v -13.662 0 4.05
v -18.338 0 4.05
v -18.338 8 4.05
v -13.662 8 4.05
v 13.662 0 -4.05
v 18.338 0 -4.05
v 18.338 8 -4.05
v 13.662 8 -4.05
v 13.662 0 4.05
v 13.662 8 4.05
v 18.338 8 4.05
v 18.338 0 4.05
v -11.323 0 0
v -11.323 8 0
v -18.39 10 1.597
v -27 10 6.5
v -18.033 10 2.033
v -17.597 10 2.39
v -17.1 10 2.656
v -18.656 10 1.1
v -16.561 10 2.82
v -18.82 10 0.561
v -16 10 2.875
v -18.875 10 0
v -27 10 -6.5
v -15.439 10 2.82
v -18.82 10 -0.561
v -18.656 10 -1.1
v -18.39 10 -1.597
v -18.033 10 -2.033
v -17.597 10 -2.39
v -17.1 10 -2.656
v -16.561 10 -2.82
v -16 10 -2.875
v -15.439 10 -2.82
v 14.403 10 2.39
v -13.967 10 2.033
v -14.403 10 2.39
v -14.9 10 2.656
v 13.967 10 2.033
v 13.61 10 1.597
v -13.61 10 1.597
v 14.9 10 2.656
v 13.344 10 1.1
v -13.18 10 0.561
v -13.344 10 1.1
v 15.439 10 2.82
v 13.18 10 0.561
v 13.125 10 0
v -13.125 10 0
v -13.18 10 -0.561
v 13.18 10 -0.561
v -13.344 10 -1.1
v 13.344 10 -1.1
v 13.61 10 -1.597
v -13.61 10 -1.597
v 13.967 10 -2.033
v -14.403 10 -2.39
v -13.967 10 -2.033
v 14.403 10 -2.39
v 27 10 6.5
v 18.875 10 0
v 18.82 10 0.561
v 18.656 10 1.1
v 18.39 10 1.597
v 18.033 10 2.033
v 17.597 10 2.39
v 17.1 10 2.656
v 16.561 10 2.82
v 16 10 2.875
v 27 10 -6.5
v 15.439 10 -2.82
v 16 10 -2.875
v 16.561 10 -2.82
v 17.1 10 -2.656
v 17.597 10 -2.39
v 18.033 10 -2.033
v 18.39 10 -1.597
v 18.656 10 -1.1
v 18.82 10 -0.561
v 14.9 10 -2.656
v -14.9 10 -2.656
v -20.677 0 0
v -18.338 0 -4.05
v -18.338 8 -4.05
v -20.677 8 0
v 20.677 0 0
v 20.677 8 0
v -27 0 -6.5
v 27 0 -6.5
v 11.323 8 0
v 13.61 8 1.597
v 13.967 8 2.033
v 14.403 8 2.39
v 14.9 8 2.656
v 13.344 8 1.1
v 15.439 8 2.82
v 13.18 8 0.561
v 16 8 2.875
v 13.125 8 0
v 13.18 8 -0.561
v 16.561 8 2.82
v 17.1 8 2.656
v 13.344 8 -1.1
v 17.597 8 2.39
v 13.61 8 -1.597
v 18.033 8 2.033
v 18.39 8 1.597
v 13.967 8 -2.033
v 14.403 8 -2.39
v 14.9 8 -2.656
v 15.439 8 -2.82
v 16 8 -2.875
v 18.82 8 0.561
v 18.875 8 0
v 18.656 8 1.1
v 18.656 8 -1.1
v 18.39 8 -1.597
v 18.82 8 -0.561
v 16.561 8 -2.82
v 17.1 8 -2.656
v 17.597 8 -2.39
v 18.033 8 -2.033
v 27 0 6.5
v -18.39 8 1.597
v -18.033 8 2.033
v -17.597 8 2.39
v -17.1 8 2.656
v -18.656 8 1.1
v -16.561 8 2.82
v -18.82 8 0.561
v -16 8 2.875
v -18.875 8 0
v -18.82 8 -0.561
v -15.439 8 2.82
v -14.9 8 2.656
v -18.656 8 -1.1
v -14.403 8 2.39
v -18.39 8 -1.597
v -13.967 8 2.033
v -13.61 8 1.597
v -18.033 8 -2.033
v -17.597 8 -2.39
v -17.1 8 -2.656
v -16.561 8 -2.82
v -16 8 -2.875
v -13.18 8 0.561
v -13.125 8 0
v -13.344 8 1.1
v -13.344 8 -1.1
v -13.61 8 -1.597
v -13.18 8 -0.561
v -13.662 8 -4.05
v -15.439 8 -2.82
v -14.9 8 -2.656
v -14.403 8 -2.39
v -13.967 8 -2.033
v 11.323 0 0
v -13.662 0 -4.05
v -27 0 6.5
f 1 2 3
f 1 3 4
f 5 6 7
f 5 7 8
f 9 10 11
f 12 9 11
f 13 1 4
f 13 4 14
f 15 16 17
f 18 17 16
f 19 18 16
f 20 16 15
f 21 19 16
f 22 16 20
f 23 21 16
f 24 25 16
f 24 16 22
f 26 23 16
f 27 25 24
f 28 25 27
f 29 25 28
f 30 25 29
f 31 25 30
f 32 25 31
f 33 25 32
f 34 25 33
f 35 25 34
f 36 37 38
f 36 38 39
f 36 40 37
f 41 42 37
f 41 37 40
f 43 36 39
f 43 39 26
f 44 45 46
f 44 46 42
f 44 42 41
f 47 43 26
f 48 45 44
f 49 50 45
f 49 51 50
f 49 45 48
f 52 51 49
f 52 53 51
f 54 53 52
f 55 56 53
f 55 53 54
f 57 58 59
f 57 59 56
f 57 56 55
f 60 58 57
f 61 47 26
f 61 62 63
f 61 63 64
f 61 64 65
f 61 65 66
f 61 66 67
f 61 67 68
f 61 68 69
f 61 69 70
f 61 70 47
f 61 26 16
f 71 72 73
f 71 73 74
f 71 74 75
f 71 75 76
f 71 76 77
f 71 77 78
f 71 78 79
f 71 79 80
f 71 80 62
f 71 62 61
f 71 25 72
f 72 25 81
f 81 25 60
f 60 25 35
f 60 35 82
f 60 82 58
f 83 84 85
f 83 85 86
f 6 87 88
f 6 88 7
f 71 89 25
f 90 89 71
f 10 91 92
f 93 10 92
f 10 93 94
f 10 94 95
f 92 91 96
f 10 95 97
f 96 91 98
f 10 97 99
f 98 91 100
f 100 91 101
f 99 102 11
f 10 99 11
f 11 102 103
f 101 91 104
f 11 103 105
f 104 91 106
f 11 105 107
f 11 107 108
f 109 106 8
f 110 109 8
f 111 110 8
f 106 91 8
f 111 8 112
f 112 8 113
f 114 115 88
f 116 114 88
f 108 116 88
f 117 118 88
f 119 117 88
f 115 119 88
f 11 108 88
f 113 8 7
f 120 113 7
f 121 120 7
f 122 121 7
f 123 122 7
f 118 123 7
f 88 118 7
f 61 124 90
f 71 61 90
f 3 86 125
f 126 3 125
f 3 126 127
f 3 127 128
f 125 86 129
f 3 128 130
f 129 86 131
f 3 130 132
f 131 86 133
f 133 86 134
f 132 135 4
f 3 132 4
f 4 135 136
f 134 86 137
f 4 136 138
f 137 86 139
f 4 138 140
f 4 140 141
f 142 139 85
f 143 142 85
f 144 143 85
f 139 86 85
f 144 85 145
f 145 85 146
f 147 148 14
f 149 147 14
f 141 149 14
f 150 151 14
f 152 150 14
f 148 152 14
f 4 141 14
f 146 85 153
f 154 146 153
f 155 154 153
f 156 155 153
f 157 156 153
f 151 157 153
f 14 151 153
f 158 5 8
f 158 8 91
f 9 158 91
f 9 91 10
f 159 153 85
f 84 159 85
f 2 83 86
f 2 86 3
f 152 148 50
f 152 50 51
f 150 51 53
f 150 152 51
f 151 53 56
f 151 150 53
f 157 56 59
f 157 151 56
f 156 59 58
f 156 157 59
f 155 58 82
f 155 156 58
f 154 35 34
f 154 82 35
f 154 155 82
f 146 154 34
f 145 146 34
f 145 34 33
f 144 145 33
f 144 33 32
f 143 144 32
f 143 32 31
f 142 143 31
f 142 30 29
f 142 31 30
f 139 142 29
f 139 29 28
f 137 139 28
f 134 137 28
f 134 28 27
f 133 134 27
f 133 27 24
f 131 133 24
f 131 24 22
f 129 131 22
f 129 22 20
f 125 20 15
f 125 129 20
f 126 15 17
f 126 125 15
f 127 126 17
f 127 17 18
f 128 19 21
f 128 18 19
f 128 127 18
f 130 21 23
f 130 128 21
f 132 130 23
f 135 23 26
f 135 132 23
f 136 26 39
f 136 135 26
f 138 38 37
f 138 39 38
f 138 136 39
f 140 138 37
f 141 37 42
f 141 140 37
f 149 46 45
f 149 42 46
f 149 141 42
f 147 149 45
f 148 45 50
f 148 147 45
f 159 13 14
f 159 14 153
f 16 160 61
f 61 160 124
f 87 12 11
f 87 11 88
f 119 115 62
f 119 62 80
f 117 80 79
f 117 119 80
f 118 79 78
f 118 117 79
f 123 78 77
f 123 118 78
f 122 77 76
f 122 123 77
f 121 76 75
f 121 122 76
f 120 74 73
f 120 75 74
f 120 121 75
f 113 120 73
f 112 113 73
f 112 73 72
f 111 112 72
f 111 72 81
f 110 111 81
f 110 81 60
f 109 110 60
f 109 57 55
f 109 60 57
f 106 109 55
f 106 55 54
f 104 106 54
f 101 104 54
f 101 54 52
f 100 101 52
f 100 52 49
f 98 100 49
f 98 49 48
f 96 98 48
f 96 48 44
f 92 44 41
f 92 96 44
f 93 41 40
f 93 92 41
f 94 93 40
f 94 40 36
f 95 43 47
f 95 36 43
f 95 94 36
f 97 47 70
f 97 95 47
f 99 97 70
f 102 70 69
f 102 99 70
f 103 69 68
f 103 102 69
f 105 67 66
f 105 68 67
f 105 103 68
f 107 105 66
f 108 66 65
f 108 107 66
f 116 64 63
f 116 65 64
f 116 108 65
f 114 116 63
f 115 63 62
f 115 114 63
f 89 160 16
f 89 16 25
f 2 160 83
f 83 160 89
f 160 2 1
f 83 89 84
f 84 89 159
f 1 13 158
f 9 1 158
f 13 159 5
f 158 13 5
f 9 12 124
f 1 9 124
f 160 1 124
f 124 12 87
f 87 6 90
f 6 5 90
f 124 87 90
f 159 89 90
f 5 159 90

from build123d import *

# Parameters (mm, degrees)
CROQUIS1_W              = 54
CROQUIS1_H              = 13
SALIENTE_EXTRUIR1_DEPTH = 10
CORTAR_EXTRUIR1_DEPTH   = 8
CROQUIS1_4_R            = 2.875
CORTAR_EXTRUIR2_DEPTH   = 11


with BuildPart() as part:
    # Croquis1 → Saliente-Extruir1 (new body)
    with BuildSketch(Plane(origin=(0, 0, 0), x_dir=(1, 0, 0), z_dir=(0, 1, 0))):
        Rectangle(CROQUIS1_W, CROQUIS1_H)
    extrude(amount=SALIENTE_EXTRUIR1_DEPTH)

    # Croquis1<3> → Cortar-Extruir1 (cut)
    with BuildSketch(Plane(origin=(0, 0, 0), x_dir=(1, 0, 0), z_dir=(0, 1, 0))):
        Polygon((-18.33826859, -4.05), (-13.66173141, -4.05), (-11.32346282, 0), (-13.66173141, 4.05), (-18.33826859, 4.05), (-20.67653718, 0), align=None)
        Polygon((20.67653718, 0), (18.33826859, 4.05), (13.66173141, 4.05), (11.32346282, 0), (13.66173141, -4.05), (18.33826859, -4.05), align=None)
    extrude(amount=CORTAR_EXTRUIR1_DEPTH, mode=Mode.SUBTRACT)

    # Croquis1<4> → Cortar-Extruir2 (cut, through all)
    with BuildSketch(Plane(origin=(0, 0, 0), x_dir=(1, 0, 0), z_dir=(0, 1, 0))):
        with Locations((-16, 0)):
            Circle(CROQUIS1_4_R)
        with Locations((16, 0)):
            Circle(CROQUIS1_4_R)
    extrude(amount=CORTAR_EXTRUIR2_DEPTH, mode=Mode.SUBTRACT)


solid = part.part
